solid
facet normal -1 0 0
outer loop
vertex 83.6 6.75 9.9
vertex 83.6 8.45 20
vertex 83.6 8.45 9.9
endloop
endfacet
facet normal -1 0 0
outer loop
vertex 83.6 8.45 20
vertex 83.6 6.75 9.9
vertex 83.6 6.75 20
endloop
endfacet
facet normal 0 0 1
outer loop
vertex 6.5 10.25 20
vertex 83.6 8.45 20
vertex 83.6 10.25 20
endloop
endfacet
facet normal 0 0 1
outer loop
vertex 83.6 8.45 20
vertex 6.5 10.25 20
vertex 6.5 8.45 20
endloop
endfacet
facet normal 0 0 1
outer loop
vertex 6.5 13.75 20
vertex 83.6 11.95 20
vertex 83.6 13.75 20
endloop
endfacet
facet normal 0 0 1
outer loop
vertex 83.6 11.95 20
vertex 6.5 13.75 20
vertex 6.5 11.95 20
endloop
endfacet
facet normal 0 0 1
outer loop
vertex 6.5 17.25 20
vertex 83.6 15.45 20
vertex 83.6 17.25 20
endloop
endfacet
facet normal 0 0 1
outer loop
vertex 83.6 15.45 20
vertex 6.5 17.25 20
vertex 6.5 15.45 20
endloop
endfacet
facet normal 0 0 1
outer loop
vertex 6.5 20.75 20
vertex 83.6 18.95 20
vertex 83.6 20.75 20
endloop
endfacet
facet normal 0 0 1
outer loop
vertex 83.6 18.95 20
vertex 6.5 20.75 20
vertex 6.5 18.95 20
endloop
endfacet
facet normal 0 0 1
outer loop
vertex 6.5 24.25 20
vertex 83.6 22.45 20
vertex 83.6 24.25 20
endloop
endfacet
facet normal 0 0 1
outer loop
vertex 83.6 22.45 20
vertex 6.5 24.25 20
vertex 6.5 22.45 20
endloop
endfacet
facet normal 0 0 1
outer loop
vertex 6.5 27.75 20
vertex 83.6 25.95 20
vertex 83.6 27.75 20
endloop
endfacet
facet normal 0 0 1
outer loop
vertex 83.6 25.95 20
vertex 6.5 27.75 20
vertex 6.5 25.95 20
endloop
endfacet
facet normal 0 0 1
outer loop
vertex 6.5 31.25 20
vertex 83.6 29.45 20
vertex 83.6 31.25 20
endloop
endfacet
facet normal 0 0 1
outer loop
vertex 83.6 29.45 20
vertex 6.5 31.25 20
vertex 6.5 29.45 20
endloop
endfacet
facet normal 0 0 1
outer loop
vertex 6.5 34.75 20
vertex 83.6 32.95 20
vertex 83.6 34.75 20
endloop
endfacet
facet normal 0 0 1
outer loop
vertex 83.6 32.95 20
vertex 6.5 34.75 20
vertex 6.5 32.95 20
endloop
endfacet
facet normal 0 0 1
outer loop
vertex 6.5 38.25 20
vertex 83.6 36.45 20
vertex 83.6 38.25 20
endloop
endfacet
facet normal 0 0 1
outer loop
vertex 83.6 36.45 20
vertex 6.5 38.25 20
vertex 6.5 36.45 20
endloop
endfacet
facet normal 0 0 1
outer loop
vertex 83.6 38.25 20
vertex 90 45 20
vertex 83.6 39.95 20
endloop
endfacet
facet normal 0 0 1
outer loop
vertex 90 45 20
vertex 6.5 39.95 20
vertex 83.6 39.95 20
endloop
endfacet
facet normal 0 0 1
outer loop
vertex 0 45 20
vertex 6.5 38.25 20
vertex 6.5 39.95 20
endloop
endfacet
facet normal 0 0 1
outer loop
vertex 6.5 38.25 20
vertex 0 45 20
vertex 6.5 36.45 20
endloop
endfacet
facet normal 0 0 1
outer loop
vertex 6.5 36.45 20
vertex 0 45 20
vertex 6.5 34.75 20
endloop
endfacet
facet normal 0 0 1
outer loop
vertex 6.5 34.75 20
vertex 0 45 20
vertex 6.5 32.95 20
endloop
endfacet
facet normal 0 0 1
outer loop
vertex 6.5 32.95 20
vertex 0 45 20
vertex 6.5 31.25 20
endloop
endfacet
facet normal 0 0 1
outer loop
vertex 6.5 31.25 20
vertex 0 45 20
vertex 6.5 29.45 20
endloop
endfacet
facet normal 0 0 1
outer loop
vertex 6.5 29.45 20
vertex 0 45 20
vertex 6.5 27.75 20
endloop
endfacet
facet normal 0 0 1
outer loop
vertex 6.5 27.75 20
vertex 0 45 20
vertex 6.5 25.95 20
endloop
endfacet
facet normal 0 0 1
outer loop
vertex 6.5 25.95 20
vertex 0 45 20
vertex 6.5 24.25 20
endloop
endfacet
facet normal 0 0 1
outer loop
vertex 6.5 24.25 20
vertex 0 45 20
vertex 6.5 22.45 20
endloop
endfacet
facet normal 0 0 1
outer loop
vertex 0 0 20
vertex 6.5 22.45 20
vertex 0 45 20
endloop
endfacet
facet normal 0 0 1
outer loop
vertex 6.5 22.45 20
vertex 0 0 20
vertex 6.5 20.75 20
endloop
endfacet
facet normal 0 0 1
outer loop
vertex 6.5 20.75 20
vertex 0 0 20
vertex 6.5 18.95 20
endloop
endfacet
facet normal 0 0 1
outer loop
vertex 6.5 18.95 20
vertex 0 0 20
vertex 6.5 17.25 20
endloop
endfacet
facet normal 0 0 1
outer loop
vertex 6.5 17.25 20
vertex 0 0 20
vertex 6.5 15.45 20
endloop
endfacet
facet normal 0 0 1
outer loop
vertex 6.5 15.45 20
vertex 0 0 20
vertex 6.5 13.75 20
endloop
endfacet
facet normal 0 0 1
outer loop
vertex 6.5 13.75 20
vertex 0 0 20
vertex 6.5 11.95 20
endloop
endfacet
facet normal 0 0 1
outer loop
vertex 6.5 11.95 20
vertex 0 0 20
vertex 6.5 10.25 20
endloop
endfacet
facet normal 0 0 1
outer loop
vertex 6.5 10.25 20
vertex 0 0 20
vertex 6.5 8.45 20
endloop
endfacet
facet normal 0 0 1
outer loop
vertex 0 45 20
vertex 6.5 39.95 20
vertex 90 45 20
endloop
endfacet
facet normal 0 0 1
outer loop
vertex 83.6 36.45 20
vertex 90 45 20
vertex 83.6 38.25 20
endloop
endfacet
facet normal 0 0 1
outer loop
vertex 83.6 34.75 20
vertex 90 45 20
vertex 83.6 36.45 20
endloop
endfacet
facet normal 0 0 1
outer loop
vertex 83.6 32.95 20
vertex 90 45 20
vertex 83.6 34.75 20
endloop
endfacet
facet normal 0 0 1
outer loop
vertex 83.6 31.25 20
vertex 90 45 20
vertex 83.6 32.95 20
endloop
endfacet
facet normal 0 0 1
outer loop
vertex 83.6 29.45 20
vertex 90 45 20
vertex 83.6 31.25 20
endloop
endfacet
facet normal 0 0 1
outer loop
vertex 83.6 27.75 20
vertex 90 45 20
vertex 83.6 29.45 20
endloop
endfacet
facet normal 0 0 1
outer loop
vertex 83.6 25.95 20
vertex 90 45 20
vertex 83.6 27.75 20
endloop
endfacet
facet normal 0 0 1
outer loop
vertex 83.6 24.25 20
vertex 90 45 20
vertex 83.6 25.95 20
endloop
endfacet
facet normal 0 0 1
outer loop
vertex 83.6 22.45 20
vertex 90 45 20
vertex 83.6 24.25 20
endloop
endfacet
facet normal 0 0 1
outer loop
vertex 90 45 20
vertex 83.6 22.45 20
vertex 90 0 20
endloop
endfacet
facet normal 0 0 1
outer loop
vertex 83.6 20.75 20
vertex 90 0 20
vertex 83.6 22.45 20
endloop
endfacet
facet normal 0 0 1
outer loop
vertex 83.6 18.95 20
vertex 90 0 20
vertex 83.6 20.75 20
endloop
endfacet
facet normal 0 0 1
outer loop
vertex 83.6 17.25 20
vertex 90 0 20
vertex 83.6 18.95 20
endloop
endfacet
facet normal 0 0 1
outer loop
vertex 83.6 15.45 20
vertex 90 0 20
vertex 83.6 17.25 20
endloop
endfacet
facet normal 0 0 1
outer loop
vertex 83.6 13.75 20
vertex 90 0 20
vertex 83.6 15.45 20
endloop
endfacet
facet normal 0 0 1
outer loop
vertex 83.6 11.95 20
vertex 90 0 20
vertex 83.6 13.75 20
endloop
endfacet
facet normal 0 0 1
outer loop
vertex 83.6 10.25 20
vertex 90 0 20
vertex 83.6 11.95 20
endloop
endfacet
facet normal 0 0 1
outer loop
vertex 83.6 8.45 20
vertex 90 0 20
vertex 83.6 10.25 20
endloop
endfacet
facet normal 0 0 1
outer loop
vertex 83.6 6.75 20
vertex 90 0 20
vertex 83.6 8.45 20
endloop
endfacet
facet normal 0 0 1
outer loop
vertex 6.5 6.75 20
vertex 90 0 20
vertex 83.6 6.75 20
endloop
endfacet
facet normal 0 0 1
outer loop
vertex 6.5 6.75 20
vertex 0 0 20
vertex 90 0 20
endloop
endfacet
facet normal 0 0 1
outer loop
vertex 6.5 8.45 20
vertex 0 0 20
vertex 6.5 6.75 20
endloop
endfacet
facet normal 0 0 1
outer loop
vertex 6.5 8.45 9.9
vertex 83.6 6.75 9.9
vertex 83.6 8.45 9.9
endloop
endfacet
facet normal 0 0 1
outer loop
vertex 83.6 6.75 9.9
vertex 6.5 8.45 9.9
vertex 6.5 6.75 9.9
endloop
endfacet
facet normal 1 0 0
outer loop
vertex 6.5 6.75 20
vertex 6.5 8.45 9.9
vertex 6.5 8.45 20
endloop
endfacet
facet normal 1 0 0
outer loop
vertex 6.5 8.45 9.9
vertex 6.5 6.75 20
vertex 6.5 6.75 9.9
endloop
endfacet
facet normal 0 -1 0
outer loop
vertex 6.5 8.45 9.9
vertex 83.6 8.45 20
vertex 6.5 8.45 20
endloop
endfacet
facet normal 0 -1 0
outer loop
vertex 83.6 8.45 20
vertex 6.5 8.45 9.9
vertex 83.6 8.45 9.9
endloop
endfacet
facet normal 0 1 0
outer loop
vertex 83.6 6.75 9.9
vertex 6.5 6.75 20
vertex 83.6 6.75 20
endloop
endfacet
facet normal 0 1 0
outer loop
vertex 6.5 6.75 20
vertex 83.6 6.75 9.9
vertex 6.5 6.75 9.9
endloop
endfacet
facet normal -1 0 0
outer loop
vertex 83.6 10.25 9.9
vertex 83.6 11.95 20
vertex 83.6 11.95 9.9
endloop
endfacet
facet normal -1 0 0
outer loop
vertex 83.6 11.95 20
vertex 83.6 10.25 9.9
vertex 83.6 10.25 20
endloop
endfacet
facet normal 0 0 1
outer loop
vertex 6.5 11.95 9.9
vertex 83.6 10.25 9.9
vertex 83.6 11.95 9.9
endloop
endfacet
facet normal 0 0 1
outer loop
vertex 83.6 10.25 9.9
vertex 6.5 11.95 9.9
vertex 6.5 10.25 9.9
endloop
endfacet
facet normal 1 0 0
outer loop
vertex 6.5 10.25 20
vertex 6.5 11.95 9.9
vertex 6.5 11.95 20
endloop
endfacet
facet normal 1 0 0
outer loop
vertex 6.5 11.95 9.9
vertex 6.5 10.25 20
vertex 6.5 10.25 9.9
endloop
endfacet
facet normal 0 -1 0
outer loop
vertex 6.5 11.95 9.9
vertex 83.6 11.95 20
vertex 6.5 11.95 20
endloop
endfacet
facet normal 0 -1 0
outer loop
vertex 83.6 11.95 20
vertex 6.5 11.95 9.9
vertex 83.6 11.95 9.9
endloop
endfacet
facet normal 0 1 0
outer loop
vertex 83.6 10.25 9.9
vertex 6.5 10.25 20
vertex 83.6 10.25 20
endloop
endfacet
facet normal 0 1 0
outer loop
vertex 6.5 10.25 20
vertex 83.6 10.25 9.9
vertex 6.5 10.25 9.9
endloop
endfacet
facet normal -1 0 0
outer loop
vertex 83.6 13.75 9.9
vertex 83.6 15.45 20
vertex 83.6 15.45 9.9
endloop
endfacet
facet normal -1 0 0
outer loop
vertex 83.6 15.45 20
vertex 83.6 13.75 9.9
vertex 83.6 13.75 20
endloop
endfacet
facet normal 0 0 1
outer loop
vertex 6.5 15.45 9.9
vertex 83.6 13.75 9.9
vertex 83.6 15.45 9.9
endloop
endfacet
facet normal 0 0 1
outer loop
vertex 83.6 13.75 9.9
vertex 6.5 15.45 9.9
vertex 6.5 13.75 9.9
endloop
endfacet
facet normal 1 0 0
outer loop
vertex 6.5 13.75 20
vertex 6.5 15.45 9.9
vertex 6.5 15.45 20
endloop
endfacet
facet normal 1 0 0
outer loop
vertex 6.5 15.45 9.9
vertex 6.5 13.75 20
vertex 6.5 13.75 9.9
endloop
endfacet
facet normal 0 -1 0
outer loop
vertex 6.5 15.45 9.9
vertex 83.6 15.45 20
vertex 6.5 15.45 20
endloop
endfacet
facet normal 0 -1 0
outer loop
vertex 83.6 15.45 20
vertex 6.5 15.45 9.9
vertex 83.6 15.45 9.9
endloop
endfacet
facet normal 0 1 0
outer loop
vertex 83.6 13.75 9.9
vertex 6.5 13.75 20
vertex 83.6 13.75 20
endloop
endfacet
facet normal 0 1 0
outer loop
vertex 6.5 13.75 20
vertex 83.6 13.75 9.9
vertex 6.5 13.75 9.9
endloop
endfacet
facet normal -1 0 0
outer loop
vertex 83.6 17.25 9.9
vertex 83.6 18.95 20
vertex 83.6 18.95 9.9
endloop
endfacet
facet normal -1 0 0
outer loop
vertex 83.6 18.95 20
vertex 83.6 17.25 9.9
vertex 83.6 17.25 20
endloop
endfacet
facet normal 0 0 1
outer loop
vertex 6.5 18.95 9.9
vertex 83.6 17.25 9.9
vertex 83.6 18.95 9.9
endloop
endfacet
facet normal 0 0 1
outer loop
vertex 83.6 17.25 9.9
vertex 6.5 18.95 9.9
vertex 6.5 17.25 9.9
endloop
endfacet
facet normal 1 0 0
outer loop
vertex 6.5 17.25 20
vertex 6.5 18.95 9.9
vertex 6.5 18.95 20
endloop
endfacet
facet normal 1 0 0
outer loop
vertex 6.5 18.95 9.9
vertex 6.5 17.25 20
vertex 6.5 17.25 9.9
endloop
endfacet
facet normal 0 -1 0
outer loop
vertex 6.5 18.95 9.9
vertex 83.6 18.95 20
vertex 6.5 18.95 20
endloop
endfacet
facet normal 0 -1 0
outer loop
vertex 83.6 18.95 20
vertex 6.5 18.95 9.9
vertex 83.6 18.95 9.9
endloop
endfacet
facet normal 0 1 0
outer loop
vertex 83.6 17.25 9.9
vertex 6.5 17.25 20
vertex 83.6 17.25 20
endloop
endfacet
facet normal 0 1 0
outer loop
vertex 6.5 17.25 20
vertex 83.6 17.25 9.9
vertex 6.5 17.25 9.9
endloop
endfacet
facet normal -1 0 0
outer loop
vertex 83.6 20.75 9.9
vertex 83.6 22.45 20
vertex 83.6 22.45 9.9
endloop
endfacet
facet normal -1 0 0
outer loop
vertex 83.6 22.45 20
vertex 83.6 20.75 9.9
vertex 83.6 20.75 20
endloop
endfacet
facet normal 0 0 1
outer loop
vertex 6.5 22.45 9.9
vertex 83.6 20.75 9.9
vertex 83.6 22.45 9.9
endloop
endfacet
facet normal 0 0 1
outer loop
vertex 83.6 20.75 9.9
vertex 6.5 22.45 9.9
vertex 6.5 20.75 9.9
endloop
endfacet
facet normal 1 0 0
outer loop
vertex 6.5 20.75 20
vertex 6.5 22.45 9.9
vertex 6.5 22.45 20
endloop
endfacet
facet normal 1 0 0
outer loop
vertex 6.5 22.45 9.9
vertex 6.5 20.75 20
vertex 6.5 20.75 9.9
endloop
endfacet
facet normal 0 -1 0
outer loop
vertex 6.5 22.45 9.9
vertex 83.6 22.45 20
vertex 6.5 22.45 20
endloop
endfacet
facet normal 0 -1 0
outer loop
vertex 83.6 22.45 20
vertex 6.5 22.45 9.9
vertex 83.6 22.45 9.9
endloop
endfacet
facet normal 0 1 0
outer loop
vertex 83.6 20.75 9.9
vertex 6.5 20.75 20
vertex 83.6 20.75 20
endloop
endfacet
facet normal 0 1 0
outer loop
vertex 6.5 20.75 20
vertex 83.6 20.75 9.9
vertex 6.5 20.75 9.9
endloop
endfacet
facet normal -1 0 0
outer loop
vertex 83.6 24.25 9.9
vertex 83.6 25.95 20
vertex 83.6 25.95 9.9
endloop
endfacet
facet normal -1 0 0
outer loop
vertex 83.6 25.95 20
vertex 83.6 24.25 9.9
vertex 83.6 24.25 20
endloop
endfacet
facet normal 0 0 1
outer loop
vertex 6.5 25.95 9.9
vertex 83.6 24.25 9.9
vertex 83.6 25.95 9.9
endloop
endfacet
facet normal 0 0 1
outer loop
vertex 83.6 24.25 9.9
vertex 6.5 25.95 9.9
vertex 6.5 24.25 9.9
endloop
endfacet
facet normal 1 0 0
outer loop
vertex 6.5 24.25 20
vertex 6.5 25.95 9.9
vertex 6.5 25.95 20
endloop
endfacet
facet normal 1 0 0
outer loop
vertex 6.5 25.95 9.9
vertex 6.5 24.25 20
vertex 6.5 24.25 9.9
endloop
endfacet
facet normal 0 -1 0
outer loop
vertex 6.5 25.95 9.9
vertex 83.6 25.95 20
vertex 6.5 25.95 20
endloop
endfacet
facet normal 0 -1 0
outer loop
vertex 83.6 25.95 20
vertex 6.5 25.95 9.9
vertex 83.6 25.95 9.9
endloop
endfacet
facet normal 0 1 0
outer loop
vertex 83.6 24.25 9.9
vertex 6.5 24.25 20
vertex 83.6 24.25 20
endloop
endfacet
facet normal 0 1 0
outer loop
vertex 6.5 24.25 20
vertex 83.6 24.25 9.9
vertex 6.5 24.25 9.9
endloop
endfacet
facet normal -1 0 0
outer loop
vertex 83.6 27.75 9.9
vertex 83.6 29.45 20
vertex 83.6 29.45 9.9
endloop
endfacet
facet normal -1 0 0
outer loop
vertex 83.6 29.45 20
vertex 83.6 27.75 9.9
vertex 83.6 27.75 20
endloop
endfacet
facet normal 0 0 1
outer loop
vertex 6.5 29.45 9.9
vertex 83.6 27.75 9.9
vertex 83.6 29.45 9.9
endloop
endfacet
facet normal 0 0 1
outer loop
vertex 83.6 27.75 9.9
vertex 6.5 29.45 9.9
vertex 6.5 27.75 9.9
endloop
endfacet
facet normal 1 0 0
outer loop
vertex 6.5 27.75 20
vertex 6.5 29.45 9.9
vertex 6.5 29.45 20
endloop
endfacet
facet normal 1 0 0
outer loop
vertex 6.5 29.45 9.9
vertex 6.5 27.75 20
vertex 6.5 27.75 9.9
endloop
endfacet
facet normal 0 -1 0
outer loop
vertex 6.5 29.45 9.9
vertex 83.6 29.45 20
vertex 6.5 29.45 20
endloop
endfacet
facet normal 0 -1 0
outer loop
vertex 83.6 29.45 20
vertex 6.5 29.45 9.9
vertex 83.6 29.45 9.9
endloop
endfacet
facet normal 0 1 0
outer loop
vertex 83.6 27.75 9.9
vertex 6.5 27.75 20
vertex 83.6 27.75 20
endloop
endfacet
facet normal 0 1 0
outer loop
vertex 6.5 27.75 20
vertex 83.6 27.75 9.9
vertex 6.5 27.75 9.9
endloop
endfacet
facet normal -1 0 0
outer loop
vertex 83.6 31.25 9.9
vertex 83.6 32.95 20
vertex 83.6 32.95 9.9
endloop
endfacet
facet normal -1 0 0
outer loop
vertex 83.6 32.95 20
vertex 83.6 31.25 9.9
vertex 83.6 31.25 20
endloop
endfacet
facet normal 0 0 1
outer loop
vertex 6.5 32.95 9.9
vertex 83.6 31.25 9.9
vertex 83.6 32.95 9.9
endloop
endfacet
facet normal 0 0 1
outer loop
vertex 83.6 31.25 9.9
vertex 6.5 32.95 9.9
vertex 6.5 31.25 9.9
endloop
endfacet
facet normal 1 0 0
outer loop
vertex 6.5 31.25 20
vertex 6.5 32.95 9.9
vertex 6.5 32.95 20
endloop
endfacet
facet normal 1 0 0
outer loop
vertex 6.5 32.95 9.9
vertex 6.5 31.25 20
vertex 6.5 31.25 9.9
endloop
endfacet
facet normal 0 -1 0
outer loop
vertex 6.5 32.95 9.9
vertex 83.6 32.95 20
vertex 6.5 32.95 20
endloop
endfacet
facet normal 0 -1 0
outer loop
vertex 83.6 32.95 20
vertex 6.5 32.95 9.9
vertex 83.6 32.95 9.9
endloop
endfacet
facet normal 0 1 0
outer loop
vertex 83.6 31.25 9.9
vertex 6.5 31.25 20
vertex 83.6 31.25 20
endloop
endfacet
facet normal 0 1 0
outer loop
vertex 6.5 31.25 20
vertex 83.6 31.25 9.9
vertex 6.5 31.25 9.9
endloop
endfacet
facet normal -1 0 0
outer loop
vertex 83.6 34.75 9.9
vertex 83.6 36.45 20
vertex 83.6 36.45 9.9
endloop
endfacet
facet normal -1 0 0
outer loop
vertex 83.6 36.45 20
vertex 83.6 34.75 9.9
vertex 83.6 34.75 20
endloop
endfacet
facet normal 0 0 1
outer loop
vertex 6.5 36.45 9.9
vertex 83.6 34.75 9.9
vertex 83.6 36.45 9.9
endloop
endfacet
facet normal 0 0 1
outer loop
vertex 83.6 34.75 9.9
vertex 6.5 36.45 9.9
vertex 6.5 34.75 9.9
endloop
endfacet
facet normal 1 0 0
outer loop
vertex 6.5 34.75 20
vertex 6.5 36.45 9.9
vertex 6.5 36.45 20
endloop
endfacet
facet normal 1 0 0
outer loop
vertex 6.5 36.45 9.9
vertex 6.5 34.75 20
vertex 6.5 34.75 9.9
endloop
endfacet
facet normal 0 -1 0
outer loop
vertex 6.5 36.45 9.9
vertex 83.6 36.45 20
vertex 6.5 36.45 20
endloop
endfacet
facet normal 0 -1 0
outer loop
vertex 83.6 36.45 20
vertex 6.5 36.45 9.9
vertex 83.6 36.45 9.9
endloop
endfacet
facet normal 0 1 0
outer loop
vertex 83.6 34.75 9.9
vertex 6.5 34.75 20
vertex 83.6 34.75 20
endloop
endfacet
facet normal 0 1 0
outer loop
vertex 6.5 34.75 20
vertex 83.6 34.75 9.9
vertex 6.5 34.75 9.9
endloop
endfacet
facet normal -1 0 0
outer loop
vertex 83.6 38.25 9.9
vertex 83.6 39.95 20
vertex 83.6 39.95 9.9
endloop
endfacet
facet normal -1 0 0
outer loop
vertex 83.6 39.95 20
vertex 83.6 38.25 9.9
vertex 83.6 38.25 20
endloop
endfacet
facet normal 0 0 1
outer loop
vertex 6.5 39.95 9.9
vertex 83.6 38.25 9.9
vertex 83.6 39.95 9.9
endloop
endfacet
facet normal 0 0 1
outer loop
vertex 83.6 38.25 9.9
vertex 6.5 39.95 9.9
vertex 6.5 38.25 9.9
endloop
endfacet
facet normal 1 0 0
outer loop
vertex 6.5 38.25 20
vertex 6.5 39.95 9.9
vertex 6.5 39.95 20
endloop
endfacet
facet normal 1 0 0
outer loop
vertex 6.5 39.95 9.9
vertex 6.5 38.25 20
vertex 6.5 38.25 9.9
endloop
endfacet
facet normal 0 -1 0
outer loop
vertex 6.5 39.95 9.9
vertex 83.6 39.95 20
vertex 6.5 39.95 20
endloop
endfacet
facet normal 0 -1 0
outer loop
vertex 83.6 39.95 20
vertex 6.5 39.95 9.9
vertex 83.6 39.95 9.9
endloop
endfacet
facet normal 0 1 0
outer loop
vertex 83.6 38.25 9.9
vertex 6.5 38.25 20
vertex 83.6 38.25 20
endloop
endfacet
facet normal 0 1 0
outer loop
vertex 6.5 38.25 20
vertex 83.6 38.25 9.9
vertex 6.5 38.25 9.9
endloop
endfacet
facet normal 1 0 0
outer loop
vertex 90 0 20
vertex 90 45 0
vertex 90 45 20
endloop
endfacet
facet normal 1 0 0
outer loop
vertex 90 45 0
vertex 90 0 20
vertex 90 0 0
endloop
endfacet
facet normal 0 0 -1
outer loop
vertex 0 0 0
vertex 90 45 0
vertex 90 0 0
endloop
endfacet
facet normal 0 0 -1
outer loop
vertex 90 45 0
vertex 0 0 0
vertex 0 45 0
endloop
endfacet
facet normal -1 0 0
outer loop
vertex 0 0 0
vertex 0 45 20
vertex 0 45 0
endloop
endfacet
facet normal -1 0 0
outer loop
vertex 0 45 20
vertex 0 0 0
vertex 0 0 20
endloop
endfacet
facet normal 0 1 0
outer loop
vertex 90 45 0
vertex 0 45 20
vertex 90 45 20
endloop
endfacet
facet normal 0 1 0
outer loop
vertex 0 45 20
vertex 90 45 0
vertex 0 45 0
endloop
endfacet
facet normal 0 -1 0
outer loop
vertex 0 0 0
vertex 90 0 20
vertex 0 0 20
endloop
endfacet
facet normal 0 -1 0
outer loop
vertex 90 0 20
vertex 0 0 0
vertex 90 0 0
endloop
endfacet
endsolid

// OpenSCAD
// Drying Rack for Microscope Slides
// Base: 90 x 45 x 20 mm
// Slots: 10 parallel slots for 75x25mm slides
// Orientation: Rests on XY plane at Z=0, builds upward.

$fn = 128; // High resolution for smooth slot edges

// --- Base Dimensions ---
base_length_X = 90;
base_width_Y = 45;
base_height_Z = 20;

// --- Slot Dimensions ---
num_slots = 10;
slide_length = 75;
slide_width = 25;
slot_width = 1.6; // Width of the slot in Y
slot_depth = 10;  // Depth of the cut in Z
slot_spacing = 3.5; // Centre-to-centre distance in Y
slot_length = 77;  // Length of the slot in X

// --- Calculated Positions ---
// Group of slots centred on the block in X and Y

// Y Positioning:
// Total width occupied by slots and gaps
total_slot_group_width = (num_slots - 1) * slot_spacing + slot_width;
y_offset_from_edge = (base_width_Y - total_slot_group_width) / 2;
// Center of the first slot
y_first_center = y_offset_from_edge + (slot_width / 2);

// X Positioning:
// Slot is 77mm long, block is 90mm long. Centered.
x_start = (base_length_X - slot_length) / 2;

// --- Main Block ---
difference() {
    // 1. Create the solid base block
    // Position: x=0, y=0, z=0
    cube([base_length_X, base_width_Y, base_height_Z], center = false);
    
    // 2. Cut the 10 parallel slots
    // We define a cutting shape and translate it to the correct position.
    // The slot runs along X, so the cutting shape is a rectangle extruded along X.
    // We add a small overcut (0.1mm) to ensure clean separation as per rules.
    
    cut_overcut = 0.1;
    
    for (i = [0 : num_slots - 1]) {
        // Calculate Y position for this slot center
        y_pos = y_first_center + (i * slot_spacing);
        
        // Define the cutting shape dimensions
        // Length along X
        cut_len_X = slot_length + cut_overcut; 
        // Width along Y
        cut_w_Y = slot_width + cut_overcut;
        // Depth along Z (must extend from top down)
        cut_d_Z = slot_depth + cut_overcut;
        
        // Position the cutter:
        // X: Start at x_start
        // Y: Center at y_pos
        // Z: Start at (base_height_Z - cut_d_Z) to cut from top down
        translate([x_start, y_pos, base_height_Z - cut_d_Z]) {
            // Extrude along X axis
            cube([cut_len_X, cut_w_Y, cut_d_Z], center = false);
        }
    }
}
